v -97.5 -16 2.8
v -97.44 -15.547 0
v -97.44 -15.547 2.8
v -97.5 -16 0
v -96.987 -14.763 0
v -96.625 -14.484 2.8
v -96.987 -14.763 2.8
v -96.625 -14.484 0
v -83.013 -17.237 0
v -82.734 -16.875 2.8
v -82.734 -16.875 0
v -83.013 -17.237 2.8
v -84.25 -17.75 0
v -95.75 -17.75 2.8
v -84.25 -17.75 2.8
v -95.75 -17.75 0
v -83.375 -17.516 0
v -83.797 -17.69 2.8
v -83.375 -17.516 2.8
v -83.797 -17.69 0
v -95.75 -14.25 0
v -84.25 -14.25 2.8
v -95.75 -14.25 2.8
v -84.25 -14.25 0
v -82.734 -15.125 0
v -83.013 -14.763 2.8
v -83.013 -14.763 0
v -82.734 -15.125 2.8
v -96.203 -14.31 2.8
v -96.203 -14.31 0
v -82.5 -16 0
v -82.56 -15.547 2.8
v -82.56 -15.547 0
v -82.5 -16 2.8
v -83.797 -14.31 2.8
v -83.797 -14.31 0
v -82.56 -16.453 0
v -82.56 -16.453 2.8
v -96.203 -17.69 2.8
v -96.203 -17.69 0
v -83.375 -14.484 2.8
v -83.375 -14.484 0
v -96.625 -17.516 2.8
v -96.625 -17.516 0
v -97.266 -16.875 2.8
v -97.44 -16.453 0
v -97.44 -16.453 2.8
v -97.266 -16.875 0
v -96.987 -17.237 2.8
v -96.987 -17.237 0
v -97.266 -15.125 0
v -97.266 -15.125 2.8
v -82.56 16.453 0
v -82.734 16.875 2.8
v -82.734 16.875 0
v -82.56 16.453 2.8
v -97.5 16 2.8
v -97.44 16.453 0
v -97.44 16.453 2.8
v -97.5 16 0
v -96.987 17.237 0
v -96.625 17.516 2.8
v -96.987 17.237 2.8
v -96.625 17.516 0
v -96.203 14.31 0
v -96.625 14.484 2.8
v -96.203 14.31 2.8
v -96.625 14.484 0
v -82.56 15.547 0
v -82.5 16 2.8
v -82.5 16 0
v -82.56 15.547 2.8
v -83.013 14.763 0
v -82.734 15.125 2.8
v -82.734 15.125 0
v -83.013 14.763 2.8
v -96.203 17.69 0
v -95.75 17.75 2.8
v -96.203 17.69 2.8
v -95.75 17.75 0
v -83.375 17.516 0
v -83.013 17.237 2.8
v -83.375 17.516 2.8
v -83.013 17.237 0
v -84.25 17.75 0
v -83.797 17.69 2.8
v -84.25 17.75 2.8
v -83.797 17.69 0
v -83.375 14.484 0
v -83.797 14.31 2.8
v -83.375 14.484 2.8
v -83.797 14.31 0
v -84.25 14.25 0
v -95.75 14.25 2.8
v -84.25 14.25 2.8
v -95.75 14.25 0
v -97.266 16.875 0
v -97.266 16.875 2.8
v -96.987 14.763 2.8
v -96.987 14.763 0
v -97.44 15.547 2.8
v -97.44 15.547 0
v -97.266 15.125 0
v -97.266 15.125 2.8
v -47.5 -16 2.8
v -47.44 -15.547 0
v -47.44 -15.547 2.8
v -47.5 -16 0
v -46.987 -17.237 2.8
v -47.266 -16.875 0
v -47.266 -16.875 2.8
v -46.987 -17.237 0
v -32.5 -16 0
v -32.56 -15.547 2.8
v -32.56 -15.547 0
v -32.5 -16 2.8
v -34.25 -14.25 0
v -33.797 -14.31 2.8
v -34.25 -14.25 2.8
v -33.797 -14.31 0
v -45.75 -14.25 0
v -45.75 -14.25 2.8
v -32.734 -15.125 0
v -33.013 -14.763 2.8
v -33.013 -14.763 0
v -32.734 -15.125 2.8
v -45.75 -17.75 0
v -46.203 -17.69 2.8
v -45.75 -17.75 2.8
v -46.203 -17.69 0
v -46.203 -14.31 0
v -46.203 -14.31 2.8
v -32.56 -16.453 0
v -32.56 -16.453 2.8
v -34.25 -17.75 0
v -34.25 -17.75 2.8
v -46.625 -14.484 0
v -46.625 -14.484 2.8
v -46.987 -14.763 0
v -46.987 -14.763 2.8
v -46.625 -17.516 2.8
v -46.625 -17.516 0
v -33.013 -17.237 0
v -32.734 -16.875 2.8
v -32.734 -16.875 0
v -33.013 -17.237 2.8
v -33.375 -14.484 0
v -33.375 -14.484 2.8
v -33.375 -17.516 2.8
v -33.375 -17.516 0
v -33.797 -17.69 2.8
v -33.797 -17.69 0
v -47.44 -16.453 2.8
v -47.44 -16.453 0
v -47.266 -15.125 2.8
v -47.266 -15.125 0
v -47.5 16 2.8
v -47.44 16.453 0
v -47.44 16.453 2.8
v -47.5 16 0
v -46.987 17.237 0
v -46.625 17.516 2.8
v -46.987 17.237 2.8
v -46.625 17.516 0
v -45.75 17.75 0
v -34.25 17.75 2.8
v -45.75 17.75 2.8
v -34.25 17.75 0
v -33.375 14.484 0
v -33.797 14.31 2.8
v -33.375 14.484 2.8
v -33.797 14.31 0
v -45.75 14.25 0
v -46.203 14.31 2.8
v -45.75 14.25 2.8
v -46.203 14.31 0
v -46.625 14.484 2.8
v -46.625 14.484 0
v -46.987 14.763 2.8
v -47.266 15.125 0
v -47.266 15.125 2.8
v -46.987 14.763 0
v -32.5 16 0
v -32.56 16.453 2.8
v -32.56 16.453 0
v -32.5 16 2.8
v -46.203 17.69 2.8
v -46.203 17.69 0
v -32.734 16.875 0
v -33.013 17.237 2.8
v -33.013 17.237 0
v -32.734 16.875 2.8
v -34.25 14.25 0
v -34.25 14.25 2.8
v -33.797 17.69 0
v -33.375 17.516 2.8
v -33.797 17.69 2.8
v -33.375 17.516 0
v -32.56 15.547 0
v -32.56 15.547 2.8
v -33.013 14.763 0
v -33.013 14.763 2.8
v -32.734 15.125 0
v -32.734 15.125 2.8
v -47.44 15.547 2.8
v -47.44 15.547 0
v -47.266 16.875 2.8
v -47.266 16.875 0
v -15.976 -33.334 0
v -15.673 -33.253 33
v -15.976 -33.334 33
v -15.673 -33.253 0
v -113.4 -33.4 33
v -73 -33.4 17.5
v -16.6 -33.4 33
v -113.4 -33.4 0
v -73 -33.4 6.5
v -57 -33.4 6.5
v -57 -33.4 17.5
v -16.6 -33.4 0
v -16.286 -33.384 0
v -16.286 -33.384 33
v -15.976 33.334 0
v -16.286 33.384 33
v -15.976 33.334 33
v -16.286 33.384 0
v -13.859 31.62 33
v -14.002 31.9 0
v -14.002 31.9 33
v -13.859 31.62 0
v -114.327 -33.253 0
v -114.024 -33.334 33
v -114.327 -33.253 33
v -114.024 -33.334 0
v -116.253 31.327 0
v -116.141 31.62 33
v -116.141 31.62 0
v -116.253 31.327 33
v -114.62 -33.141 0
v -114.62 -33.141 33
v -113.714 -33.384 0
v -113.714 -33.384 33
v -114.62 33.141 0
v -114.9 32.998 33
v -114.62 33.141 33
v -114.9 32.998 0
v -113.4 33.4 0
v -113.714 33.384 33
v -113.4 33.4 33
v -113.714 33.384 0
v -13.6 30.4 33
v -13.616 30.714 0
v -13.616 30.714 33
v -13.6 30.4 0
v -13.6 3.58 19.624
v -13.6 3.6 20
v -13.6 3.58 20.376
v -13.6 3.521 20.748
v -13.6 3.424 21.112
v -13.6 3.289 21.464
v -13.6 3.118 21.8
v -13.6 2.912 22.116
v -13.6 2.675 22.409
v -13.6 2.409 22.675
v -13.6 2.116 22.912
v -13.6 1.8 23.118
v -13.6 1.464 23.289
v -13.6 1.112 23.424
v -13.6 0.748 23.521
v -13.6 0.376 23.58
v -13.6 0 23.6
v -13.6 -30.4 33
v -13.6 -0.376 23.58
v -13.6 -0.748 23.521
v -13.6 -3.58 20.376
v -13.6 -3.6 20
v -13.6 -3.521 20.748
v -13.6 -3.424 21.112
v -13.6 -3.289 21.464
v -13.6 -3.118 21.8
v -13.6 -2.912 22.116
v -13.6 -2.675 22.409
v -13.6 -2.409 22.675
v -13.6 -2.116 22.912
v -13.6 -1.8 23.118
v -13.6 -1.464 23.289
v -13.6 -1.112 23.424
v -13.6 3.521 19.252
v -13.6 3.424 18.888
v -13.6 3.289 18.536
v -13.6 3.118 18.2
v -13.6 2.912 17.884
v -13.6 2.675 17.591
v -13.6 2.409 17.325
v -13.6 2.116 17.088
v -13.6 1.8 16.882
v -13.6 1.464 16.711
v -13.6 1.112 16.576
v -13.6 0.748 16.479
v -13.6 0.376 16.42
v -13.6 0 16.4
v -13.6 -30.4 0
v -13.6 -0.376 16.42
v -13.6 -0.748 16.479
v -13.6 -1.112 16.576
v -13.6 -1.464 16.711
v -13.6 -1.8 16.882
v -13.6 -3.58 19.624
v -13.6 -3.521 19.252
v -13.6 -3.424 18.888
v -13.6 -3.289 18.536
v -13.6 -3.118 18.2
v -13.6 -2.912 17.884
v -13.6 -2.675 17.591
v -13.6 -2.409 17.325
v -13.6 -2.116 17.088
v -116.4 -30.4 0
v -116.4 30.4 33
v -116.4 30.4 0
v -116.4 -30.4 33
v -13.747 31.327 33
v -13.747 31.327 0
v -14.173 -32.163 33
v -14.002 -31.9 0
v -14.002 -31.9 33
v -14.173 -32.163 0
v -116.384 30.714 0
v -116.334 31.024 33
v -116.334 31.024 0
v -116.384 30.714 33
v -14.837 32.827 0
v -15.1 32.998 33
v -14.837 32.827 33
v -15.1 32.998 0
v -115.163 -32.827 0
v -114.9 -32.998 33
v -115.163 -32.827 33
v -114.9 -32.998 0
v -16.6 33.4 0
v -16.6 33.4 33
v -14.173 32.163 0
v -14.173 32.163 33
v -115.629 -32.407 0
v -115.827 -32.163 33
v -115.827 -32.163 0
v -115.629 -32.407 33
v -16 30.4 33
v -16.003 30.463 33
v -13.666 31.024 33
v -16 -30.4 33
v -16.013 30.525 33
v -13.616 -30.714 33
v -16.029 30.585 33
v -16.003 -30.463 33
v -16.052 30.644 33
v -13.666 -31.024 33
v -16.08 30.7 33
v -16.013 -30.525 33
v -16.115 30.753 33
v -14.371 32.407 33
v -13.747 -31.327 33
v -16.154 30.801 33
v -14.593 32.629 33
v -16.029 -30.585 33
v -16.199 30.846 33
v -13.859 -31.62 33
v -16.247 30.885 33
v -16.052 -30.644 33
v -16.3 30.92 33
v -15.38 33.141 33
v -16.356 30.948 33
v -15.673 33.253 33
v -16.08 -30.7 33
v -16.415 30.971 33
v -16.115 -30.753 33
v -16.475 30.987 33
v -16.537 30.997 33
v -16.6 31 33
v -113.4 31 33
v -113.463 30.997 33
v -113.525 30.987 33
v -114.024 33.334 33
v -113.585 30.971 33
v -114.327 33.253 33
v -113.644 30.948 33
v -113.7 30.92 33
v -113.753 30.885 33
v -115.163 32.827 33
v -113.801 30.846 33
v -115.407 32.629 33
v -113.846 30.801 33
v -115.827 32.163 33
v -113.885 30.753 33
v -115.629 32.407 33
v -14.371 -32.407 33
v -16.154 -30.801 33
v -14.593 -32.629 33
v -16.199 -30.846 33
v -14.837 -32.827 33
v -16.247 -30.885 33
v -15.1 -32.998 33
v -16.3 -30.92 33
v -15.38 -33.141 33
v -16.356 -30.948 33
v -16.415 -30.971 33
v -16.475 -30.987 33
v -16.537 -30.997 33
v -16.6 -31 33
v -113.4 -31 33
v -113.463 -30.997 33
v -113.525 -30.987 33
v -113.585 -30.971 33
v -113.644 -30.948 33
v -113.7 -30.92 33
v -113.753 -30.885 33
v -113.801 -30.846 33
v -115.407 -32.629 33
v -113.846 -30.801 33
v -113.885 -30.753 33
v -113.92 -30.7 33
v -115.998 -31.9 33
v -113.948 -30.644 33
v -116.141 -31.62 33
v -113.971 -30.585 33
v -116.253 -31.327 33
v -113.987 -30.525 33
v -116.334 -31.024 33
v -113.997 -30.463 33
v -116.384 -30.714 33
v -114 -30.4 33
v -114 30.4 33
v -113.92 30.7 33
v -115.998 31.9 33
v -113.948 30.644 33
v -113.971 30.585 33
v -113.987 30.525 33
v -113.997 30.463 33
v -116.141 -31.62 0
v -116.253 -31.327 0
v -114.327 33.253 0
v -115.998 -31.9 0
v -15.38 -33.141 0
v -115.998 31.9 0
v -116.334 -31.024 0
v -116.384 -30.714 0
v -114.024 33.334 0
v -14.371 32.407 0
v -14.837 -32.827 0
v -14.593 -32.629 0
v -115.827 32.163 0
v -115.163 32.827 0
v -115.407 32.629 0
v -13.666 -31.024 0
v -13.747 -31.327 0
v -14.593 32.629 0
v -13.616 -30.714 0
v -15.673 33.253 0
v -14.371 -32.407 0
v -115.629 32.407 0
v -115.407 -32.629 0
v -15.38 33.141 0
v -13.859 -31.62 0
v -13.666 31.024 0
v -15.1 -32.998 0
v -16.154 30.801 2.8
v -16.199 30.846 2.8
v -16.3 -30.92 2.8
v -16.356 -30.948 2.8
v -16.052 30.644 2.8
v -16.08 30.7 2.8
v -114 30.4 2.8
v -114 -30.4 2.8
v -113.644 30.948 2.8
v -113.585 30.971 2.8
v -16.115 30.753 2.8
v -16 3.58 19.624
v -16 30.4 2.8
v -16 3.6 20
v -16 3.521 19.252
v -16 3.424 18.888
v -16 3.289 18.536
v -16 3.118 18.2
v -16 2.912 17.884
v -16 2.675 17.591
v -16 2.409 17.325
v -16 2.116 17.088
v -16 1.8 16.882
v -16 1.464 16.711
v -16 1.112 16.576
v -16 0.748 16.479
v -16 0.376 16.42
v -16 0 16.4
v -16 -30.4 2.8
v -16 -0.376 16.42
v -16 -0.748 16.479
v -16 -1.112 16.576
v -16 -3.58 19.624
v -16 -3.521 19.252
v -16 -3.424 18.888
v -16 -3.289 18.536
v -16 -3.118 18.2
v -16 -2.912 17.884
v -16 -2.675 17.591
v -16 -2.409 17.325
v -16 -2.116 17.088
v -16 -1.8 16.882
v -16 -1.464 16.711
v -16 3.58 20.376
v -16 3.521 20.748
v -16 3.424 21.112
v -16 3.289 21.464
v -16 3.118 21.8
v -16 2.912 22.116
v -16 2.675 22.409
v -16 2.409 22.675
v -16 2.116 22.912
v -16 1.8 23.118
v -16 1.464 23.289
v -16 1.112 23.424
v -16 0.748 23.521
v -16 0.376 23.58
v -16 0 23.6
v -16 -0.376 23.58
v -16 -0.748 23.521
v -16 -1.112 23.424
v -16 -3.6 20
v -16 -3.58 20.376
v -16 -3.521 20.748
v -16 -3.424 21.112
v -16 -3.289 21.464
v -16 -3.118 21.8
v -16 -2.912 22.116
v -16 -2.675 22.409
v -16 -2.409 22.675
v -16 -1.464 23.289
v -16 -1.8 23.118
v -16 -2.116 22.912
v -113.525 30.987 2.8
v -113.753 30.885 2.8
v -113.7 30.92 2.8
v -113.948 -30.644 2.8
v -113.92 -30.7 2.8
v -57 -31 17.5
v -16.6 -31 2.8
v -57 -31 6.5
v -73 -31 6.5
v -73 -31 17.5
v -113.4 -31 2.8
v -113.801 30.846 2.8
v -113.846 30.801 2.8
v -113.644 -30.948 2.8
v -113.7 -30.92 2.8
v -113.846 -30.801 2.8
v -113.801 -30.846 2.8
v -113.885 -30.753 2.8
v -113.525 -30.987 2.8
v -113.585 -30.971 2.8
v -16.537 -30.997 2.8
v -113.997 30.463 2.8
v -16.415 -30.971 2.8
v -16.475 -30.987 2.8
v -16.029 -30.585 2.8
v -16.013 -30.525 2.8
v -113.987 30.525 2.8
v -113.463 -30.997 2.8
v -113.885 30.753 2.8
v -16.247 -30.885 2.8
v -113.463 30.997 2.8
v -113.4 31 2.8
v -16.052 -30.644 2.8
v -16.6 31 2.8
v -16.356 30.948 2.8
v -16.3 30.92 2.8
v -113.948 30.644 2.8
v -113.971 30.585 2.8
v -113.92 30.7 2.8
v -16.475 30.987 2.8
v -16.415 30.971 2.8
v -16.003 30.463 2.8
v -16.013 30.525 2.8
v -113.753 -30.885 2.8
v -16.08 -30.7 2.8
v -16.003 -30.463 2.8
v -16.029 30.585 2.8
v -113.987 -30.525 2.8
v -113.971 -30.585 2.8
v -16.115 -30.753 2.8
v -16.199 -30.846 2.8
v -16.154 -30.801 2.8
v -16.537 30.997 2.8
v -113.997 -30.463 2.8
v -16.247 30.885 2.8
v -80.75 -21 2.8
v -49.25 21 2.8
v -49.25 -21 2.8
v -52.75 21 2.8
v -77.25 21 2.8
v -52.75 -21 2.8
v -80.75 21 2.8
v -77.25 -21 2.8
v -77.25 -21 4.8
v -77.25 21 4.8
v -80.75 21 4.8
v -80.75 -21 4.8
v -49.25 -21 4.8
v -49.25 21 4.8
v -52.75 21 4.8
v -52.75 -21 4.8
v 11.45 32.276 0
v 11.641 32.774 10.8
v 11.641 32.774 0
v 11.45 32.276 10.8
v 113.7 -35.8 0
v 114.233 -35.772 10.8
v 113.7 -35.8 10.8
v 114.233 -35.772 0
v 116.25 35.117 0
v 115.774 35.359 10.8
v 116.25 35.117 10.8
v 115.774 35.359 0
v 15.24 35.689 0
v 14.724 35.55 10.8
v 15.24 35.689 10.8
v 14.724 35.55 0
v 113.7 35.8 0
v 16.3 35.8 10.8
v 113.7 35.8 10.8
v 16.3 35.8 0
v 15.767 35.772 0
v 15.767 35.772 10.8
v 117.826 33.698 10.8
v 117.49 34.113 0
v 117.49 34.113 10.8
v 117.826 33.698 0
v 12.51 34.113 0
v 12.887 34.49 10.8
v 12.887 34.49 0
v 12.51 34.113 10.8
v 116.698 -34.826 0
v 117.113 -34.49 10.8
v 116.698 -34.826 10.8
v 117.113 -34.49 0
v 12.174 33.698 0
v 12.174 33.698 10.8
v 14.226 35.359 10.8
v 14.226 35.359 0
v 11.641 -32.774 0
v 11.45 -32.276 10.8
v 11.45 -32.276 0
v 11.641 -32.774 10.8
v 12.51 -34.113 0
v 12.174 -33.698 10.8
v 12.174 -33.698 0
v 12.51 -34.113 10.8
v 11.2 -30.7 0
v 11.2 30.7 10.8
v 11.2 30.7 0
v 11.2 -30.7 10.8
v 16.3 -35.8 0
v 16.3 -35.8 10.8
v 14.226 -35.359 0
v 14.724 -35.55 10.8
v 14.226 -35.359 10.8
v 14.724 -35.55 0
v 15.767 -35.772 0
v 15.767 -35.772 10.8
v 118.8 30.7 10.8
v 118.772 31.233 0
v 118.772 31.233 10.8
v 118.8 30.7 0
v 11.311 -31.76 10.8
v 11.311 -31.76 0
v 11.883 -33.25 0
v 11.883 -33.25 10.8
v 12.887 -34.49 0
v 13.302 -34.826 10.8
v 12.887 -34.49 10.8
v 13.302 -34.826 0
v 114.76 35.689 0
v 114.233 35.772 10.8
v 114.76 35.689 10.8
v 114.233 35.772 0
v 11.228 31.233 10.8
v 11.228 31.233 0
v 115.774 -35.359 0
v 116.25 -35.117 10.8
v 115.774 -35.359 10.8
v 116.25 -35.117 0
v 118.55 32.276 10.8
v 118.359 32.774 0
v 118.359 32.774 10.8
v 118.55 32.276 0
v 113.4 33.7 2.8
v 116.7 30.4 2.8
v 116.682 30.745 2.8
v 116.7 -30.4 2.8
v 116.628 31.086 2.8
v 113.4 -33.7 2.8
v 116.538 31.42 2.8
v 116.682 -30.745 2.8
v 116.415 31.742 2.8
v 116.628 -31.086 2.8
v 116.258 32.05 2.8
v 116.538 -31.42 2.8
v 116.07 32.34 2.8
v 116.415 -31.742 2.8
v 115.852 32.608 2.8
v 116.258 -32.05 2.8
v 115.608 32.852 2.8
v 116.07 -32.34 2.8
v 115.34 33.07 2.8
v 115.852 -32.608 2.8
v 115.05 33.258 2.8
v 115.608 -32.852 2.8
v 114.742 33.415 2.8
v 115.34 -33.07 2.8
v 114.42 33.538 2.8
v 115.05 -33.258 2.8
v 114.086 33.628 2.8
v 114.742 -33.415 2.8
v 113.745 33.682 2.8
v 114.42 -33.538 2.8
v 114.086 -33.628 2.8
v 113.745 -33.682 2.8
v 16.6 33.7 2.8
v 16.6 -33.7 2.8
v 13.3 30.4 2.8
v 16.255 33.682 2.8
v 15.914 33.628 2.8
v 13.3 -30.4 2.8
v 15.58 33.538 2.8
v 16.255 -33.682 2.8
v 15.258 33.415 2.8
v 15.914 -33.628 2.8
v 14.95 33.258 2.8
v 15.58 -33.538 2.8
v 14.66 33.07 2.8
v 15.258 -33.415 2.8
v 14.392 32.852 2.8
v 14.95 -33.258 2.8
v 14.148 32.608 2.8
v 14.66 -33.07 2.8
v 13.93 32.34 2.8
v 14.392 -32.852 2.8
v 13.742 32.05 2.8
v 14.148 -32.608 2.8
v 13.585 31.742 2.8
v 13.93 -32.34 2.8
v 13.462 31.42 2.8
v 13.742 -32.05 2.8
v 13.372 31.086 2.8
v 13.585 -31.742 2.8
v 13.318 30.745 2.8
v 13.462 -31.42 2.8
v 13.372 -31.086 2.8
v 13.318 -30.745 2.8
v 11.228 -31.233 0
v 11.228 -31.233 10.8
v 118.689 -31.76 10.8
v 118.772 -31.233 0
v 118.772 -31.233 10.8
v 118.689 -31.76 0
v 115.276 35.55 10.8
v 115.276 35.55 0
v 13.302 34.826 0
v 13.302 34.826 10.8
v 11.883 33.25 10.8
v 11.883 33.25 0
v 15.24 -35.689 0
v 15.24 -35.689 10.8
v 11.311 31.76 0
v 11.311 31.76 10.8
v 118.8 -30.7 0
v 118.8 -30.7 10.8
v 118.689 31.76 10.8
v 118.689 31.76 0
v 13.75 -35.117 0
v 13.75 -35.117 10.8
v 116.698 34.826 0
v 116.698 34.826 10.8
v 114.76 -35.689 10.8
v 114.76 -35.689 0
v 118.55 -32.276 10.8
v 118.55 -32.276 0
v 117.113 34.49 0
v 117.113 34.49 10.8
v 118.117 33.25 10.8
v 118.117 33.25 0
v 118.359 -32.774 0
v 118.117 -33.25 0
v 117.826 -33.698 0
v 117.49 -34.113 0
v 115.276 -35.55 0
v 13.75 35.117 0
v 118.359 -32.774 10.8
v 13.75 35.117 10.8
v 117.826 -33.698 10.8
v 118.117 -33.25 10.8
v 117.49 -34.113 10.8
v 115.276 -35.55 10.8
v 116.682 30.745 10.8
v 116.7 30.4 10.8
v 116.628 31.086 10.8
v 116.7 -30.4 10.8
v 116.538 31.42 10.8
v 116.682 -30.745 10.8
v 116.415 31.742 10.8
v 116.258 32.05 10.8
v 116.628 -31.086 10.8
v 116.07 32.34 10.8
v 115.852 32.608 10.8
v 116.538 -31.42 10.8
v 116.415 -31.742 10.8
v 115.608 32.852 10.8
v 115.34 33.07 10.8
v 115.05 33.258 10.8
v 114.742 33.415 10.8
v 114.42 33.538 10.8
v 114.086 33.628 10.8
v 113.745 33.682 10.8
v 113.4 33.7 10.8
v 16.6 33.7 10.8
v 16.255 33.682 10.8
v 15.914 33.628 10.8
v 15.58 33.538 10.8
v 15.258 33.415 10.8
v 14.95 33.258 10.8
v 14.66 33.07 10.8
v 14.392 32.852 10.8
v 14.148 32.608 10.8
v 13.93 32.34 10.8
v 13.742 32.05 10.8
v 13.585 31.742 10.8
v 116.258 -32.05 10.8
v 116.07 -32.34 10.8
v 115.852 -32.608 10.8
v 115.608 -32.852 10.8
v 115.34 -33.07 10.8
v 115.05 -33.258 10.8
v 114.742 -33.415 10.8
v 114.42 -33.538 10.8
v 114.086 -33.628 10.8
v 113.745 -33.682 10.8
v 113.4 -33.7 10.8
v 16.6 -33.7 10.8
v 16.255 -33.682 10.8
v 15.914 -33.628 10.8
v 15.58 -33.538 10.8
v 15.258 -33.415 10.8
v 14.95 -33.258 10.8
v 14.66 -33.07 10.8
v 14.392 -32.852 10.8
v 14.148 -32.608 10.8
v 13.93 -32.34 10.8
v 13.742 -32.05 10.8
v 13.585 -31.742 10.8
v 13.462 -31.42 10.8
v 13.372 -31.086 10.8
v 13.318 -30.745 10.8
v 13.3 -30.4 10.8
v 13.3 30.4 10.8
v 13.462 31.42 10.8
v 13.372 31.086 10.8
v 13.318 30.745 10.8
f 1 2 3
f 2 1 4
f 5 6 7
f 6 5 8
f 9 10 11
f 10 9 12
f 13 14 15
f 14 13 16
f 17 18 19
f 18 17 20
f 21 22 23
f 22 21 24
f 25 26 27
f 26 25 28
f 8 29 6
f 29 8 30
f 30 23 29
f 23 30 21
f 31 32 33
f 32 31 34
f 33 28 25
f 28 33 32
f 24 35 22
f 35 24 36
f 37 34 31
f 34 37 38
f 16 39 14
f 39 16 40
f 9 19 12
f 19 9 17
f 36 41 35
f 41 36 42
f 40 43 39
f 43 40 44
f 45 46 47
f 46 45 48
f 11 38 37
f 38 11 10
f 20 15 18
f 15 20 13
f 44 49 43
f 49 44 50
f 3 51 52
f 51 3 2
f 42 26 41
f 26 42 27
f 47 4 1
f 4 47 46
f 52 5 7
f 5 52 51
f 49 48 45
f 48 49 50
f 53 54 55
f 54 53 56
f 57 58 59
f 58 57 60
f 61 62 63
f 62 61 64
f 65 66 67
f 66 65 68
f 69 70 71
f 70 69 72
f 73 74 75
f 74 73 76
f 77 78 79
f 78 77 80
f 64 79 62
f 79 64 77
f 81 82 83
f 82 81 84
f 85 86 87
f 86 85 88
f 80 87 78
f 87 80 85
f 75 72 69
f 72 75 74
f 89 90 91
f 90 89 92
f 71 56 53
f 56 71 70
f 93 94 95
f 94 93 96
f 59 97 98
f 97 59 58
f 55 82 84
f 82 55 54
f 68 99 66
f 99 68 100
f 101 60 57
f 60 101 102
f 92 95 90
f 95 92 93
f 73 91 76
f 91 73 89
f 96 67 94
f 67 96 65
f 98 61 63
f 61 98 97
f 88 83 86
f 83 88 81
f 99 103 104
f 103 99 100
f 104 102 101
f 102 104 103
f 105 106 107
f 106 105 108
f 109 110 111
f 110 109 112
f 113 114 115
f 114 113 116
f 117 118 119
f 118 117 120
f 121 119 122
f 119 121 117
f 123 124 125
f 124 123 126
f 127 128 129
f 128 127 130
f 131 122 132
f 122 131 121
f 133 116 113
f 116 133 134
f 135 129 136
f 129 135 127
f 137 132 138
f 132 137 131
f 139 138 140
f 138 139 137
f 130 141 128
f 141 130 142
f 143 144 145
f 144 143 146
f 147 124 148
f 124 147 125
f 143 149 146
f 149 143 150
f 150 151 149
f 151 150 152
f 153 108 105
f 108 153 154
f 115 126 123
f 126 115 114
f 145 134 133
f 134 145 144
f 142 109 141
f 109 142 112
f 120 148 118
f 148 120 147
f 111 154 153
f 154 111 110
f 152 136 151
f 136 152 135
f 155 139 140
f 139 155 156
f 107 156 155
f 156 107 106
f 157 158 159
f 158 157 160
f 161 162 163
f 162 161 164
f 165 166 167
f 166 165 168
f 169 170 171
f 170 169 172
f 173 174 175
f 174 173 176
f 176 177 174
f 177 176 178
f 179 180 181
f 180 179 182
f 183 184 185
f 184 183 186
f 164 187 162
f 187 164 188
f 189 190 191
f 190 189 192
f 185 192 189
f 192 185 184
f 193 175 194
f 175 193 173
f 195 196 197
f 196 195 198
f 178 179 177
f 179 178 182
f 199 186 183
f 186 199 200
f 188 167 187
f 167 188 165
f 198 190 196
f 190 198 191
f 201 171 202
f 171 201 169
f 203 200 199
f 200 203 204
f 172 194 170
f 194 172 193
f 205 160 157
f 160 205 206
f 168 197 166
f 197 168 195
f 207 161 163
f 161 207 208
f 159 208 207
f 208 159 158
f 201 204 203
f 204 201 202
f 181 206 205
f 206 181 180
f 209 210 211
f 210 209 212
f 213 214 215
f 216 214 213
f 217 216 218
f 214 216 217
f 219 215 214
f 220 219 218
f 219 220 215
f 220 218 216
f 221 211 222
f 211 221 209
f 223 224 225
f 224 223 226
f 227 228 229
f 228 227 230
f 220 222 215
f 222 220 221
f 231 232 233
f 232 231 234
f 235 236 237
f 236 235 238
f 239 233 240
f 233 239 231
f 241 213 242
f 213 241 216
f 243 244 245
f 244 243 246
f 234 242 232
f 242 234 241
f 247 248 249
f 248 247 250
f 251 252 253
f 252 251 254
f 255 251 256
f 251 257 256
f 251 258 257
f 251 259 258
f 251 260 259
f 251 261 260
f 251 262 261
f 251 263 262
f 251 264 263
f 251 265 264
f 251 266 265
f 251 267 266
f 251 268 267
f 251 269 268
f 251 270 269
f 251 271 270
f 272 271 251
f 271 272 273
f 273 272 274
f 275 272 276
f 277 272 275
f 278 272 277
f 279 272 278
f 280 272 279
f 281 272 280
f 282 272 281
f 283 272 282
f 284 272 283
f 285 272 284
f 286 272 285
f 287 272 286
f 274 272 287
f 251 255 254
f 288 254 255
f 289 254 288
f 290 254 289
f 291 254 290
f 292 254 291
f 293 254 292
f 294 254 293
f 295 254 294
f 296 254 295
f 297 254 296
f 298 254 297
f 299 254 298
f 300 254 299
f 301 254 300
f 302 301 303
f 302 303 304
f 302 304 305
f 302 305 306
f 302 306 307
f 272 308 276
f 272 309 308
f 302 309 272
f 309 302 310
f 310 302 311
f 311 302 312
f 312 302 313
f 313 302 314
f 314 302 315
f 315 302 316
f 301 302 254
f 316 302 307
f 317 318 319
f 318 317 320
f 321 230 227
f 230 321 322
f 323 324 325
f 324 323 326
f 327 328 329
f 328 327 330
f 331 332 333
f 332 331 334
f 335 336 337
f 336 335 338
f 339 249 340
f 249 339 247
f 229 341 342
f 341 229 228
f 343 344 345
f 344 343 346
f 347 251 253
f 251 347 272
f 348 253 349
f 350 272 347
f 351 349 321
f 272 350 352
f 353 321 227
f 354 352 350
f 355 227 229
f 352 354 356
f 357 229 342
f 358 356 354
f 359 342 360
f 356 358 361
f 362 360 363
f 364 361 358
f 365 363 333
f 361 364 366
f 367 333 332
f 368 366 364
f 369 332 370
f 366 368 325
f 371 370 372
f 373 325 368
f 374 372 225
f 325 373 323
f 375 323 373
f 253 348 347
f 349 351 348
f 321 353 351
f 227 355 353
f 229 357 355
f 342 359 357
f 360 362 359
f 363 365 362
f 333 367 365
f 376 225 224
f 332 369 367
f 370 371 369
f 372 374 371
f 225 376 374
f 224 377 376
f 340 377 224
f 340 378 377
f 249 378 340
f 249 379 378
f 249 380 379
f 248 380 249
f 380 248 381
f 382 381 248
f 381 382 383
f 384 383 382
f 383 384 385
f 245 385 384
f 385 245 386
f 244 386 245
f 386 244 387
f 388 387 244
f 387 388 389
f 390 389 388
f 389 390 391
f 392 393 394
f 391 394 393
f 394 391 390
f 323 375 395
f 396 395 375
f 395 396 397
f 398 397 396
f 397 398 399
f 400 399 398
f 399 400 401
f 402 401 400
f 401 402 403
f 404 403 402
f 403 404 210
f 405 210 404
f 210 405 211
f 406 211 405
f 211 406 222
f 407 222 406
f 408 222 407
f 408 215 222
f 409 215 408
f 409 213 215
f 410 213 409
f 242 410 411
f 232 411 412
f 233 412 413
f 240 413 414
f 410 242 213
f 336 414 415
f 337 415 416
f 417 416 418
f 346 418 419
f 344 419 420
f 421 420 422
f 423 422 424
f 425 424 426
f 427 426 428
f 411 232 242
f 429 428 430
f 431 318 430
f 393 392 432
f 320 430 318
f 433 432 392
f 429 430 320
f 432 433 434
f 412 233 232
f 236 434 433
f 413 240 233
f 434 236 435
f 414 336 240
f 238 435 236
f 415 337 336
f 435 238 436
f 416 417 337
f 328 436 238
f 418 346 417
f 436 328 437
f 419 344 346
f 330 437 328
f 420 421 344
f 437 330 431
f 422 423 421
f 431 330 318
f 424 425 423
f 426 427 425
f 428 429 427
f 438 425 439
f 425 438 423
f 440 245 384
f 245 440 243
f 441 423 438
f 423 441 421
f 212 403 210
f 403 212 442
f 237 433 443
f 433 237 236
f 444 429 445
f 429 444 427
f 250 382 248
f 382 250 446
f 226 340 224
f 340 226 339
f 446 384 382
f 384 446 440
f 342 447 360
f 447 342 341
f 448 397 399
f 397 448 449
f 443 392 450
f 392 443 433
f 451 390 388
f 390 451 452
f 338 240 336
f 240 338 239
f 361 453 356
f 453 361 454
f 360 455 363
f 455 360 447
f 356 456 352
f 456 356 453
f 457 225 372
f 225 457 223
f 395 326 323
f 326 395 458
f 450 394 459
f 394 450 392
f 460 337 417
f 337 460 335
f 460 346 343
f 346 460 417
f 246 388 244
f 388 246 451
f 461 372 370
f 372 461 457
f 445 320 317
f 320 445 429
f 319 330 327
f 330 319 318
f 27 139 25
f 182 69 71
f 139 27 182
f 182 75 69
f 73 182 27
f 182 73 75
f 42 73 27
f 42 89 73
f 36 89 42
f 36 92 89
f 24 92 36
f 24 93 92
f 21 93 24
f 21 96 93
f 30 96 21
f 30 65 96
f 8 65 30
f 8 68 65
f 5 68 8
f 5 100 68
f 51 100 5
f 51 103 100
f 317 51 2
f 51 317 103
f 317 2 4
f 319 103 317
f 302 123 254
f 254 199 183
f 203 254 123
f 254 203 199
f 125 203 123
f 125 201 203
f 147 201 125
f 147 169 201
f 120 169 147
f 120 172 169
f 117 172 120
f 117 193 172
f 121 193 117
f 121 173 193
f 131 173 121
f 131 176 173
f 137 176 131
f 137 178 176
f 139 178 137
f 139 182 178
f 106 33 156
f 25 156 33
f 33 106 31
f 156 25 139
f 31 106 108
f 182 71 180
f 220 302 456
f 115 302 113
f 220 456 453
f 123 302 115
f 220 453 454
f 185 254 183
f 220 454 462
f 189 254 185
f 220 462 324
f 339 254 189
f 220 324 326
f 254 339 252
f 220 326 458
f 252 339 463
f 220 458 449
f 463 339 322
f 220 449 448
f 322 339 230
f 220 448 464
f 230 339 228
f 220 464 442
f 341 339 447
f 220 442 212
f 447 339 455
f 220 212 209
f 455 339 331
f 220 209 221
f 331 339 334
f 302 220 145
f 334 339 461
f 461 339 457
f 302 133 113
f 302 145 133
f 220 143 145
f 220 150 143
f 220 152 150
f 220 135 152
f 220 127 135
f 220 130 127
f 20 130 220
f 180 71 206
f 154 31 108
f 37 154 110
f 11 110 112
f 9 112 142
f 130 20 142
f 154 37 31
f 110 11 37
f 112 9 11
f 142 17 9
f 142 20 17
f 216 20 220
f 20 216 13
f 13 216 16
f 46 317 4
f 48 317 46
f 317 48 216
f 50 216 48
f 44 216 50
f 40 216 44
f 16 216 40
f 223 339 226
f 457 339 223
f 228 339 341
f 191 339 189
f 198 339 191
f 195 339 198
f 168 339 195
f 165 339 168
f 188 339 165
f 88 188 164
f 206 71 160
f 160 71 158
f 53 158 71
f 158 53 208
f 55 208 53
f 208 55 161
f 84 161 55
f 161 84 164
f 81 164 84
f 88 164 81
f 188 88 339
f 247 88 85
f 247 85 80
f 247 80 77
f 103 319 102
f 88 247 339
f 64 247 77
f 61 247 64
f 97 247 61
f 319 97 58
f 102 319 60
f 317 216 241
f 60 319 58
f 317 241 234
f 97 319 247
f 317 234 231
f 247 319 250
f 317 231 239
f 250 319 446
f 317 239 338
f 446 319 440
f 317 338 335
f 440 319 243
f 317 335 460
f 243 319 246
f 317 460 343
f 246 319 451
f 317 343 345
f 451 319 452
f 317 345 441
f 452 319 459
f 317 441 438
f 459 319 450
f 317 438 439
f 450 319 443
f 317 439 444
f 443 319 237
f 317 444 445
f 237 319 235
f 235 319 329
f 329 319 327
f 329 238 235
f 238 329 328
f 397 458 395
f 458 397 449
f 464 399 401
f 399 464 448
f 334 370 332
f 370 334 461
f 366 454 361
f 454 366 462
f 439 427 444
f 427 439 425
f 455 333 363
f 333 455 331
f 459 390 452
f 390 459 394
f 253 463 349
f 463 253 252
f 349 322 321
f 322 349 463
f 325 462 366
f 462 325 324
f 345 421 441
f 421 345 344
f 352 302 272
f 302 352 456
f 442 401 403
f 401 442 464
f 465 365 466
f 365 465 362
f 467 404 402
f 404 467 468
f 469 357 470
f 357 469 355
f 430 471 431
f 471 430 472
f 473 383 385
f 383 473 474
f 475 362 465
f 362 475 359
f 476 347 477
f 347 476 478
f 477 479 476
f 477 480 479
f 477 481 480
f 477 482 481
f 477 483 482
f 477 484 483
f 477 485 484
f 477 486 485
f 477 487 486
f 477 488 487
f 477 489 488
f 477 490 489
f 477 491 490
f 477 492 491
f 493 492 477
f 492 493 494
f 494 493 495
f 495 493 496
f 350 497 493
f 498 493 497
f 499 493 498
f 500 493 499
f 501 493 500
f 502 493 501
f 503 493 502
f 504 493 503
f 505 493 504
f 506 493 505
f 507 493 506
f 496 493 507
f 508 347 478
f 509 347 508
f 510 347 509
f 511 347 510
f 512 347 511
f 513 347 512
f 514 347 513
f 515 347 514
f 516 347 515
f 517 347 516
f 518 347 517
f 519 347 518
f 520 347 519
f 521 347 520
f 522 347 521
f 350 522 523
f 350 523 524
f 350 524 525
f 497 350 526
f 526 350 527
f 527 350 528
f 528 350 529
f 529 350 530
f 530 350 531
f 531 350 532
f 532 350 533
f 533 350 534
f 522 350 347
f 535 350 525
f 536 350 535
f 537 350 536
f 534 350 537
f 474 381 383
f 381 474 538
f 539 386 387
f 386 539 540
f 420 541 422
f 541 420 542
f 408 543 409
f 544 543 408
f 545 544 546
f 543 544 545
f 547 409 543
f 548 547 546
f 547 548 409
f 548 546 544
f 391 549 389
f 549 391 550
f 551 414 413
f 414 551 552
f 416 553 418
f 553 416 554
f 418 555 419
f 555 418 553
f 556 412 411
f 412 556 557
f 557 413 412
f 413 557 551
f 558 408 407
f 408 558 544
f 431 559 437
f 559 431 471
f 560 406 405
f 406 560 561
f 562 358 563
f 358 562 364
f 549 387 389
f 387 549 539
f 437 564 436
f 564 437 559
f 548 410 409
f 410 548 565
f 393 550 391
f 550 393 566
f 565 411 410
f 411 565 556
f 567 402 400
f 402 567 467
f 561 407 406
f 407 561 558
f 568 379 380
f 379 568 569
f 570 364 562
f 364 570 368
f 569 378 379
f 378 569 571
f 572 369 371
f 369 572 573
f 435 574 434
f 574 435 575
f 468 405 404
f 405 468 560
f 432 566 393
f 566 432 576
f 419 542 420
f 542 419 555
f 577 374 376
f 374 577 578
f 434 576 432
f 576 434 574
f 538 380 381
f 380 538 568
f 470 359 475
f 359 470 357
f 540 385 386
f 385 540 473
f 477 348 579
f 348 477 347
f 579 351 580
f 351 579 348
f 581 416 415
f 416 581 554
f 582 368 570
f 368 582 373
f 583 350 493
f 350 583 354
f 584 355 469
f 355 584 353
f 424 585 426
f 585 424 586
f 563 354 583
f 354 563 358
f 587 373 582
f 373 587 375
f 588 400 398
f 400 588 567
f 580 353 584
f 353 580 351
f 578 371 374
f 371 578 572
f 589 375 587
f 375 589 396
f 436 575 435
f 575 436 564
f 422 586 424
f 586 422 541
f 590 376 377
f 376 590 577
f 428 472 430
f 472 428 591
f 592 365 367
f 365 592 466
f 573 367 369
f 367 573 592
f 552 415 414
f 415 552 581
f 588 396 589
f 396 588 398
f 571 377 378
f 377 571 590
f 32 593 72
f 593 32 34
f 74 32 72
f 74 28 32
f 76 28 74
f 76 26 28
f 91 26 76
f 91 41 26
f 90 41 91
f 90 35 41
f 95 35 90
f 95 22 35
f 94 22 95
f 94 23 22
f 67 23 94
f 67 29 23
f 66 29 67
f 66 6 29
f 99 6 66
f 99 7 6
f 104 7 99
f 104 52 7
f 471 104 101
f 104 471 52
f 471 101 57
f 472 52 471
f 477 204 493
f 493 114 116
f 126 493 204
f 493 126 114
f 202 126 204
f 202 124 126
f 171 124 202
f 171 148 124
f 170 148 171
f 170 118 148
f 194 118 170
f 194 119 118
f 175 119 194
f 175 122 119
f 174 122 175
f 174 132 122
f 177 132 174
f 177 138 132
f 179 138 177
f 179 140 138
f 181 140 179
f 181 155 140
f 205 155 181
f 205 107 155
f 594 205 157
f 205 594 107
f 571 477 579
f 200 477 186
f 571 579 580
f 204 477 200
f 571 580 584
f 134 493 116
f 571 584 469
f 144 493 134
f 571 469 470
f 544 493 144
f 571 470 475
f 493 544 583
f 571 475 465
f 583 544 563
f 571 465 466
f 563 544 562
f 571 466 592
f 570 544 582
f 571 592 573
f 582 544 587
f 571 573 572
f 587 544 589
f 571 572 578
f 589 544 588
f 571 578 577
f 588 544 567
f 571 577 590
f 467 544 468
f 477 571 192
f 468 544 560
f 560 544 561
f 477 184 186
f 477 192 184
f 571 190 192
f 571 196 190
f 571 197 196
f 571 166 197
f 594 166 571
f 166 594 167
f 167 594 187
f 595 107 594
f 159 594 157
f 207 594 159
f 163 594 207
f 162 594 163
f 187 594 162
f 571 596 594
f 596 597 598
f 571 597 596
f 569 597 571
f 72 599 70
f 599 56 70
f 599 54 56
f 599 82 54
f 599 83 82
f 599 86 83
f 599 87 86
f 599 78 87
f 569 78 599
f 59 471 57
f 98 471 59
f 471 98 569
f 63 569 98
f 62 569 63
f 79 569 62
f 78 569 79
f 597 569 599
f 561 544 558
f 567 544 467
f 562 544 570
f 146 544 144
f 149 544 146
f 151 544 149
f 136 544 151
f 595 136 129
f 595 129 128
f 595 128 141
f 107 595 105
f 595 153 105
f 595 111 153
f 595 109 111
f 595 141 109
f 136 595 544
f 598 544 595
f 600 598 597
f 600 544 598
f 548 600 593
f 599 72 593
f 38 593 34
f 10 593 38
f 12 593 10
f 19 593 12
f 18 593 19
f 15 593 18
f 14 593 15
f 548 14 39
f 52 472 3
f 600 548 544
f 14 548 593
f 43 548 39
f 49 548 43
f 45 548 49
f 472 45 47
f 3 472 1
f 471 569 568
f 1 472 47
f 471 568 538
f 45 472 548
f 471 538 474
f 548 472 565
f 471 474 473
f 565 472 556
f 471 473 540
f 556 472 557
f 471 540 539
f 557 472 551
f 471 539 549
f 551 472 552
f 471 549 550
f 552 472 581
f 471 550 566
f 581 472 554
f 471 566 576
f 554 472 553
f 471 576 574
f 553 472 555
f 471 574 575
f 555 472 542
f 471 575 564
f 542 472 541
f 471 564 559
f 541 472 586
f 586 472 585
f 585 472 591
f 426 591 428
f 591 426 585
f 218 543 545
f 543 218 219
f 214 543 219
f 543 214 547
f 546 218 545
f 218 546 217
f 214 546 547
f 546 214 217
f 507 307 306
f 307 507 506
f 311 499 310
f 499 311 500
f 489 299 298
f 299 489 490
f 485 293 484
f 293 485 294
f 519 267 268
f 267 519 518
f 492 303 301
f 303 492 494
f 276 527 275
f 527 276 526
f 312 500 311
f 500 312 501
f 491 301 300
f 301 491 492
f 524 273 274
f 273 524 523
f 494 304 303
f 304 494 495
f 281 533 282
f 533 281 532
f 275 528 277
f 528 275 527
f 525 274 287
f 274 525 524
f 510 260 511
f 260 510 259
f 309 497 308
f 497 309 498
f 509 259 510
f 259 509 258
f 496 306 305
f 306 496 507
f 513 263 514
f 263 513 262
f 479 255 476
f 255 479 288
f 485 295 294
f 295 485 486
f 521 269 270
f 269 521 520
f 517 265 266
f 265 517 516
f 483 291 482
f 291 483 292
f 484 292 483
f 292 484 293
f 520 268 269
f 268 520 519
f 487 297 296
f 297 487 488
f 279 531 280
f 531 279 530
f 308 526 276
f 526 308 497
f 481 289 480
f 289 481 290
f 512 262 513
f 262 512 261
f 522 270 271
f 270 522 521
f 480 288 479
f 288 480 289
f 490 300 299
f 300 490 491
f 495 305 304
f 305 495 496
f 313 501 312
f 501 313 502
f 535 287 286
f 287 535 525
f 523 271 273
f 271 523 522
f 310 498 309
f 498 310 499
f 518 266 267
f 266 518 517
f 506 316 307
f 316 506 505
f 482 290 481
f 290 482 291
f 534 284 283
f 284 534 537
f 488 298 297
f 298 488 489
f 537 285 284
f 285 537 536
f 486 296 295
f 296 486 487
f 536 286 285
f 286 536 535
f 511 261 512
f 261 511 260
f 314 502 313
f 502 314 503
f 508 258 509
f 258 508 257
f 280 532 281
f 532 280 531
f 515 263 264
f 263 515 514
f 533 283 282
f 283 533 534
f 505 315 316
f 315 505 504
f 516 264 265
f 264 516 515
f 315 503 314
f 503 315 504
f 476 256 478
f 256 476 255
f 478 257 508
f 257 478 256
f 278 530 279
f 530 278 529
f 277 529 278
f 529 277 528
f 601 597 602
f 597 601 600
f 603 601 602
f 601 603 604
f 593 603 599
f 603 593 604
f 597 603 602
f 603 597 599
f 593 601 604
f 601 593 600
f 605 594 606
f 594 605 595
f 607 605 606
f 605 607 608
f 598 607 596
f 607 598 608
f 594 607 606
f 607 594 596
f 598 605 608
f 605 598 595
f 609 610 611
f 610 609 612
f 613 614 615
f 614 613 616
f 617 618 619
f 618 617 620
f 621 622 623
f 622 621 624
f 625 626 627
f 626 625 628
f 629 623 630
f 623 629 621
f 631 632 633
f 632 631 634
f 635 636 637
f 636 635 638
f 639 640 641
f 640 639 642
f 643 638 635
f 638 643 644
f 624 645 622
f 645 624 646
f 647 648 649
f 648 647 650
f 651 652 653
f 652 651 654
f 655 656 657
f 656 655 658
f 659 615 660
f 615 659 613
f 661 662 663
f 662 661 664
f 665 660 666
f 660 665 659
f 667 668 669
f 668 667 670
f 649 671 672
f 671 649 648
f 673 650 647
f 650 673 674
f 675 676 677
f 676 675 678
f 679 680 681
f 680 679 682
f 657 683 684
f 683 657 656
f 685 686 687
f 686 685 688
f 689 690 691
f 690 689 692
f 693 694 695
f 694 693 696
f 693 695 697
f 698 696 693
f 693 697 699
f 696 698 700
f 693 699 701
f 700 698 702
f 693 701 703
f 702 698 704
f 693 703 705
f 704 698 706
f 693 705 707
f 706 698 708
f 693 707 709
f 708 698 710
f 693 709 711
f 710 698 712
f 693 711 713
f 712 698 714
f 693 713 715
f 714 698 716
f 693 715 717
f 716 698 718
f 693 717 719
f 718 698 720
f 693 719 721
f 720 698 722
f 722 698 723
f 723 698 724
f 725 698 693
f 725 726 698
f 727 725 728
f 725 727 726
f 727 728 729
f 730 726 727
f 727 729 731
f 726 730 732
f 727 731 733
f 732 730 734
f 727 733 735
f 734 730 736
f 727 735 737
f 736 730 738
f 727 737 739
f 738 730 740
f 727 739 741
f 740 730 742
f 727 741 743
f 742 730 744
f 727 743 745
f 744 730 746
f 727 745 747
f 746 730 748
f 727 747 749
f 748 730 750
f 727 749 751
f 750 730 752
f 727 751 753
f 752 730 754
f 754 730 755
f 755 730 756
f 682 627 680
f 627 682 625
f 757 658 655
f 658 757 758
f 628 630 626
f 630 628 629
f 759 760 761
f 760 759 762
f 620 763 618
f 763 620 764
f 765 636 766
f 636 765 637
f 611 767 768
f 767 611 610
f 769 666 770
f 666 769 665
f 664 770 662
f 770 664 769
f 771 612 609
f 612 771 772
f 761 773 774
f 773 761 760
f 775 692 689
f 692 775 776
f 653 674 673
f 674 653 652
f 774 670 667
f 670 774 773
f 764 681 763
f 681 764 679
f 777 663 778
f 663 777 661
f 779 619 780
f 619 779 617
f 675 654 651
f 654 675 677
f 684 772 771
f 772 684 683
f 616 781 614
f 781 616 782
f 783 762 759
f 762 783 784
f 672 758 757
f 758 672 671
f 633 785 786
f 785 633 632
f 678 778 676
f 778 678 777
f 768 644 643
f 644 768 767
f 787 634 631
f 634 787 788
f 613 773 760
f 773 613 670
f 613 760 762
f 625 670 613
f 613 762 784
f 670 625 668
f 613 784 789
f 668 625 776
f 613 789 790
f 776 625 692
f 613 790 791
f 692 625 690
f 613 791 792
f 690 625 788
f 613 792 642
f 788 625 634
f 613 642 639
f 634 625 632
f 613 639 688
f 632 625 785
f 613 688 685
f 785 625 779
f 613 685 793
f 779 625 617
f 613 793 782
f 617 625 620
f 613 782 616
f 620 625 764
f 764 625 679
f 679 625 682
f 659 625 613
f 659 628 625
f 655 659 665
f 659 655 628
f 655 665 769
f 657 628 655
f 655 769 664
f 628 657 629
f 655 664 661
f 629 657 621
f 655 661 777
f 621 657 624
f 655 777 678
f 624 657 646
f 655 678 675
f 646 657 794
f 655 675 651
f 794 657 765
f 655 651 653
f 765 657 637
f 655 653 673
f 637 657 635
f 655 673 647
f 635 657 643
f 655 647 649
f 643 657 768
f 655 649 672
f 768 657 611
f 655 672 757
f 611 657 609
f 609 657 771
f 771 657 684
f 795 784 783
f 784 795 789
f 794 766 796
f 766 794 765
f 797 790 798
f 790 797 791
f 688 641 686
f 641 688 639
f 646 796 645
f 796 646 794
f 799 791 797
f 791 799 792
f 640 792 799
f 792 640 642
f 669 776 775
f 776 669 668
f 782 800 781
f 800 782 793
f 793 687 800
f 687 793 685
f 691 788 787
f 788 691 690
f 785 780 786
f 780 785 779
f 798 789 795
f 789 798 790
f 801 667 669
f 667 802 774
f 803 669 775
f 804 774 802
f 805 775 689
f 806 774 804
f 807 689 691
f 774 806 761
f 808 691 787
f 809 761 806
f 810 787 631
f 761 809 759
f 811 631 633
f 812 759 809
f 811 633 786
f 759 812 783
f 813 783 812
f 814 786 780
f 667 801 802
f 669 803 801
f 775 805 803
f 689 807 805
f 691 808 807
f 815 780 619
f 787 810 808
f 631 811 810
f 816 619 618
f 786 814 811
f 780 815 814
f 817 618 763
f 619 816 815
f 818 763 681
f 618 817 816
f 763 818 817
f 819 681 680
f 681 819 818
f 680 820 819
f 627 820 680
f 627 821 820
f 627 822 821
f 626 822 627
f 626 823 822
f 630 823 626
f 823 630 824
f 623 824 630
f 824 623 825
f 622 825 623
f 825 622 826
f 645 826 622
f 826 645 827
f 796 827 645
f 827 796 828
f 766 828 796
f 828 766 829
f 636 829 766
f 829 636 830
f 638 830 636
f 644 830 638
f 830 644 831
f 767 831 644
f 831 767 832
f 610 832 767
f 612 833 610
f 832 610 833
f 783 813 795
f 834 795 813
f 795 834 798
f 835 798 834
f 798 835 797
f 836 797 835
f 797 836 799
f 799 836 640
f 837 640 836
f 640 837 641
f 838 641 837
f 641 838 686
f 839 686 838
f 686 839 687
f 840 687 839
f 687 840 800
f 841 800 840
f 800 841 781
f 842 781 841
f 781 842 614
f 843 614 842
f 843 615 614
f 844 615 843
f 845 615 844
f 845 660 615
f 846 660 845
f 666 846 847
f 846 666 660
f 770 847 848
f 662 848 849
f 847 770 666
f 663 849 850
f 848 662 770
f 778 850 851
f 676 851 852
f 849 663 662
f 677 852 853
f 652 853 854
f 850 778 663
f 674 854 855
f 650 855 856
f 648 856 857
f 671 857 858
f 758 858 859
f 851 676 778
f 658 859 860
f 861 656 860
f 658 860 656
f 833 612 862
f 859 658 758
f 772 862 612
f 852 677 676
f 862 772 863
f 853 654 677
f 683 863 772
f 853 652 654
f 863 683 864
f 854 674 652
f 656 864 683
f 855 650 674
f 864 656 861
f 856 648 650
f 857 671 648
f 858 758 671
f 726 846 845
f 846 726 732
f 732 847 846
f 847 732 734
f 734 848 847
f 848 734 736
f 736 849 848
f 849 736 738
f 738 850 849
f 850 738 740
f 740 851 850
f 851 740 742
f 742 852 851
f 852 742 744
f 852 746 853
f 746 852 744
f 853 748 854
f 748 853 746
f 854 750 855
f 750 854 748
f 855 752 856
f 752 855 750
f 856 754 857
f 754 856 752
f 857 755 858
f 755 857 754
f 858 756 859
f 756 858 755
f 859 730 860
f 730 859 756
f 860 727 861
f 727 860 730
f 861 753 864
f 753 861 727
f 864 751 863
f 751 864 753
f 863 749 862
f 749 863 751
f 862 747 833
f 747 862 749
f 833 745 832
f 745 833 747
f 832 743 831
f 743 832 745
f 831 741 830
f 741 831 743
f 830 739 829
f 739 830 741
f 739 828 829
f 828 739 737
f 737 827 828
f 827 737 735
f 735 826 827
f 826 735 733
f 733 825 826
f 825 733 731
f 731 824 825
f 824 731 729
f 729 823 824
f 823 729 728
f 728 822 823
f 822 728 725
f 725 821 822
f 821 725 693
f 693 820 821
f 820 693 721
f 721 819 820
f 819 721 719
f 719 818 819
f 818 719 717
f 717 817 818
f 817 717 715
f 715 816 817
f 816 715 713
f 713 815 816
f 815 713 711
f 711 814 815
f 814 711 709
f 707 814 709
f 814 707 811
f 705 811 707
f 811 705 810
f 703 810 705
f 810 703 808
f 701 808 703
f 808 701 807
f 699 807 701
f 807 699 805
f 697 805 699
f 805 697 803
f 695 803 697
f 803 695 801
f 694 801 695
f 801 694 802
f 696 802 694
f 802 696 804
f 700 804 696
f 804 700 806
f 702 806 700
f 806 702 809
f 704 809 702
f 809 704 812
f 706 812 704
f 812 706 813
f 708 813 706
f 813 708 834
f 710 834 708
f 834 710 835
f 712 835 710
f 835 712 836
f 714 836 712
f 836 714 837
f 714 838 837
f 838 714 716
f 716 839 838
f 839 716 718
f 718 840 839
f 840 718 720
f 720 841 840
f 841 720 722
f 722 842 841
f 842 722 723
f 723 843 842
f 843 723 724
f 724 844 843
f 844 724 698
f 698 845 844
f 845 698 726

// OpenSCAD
/* BLACKBOX/GHOSTLINK adjustable electronics field-node case
   Unit: mm. Generically sized; fit against your actual PCB, ports,
   connectors and antenna before printing. Not waterproof, EMI-shielded or EMP-rated.
   Print lid with flat outer roof surface down.
   Set PART to "base", "lid", or "layout" before exporting STL.
*/
$fn = 60;
PART = "layout";
inner_x = 98;  // intended free interior width
inner_y = 62;  // intended free interior depth
height = 33;   // total base height
wall = 2.4;
floor_thickness = 2.8;
lid_wall = 2.1;
lid_roof = 2.8;
lid_skirt = 8;
fit_clearance = 0.30; // each side; adjust after real calibration test
corner = 3.0;
antenna_hole_d = 7.2; // optional bulkhead hole; validate component before use
cable_opening_w = 16;
cable_opening_z = 11;

outer_x = inner_x + 2*wall;
outer_y = inner_y + 2*wall;

module rounded_rect(x,y,r){
  offset(r=r) square([x-2*r,y-2*r],center=true);
}
module slot3d(len,w,z){
  linear_extrude(height=z) hull(){
    translate([-(len-w)/2,0]) circle(d=w,$fn=24);
    translate([(len-w)/2,0]) circle(d=w,$fn=24);
  }
}
module base(){
 difference(){
   linear_extrude(height=height) rounded_rect(outer_x,outer_y,corner);
   translate([0,0,floor_thickness]) linear_extrude(height=height+1)
     rounded_rect(inner_x,inner_y,max(0.6,corner-wall));
   // Two rows of tie-down slots through the floor. Deliberately open to air.
   for (xx=[-25,25], yy=[-16,16])
     translate([xx,yy,-0.1]) slot3d(15,3.5,floor_thickness+0.3);
   // Generic cable access: on the short side, deliberately above the floor.
   translate([0,-outer_y/2,12]) cube([cable_opening_w,wall*4,cable_opening_z],center=true);
   // Antenna bulkhead hole on right wall.
   translate([outer_x/2,0,20]) rotate([0,90,0]) cylinder(d=antenna_hole_d,h=wall*4,center=true);
 }
 // Lightweight floor rails to separate electronics from the outer shell base.
 for (xx=[-14,14])
   translate([xx,0,floor_thickness+1]) cube([3.5,inner_y-20,2],center=true);
}
module lid(){
 lid_in_x=outer_x+2*fit_clearance;
 lid_in_y=outer_y+2*fit_clearance;
 lid_out_x=lid_in_x+2*lid_wall;
 lid_out_y=lid_in_y+2*lid_wall;
 difference(){
   union(){
     linear_extrude(height=lid_roof) rounded_rect(lid_out_x,lid_out_y,corner+lid_wall);
     translate([0,0,lid_roof]) linear_extrude(height=lid_skirt)
       difference(){
         rounded_rect(lid_out_x,lid_out_y,corner+lid_wall);
         rounded_rect(lid_in_x,lid_in_y,corner+fit_clearance);
       }
   }
   // No unverified screw posts. Slip fit measured in physical prototype.
 }
}
if(PART=="base") base();
else if(PART=="lid") lid();
else {
  translate([-65,0,0]) base();
  translate([65,0,0]) lid();
}
